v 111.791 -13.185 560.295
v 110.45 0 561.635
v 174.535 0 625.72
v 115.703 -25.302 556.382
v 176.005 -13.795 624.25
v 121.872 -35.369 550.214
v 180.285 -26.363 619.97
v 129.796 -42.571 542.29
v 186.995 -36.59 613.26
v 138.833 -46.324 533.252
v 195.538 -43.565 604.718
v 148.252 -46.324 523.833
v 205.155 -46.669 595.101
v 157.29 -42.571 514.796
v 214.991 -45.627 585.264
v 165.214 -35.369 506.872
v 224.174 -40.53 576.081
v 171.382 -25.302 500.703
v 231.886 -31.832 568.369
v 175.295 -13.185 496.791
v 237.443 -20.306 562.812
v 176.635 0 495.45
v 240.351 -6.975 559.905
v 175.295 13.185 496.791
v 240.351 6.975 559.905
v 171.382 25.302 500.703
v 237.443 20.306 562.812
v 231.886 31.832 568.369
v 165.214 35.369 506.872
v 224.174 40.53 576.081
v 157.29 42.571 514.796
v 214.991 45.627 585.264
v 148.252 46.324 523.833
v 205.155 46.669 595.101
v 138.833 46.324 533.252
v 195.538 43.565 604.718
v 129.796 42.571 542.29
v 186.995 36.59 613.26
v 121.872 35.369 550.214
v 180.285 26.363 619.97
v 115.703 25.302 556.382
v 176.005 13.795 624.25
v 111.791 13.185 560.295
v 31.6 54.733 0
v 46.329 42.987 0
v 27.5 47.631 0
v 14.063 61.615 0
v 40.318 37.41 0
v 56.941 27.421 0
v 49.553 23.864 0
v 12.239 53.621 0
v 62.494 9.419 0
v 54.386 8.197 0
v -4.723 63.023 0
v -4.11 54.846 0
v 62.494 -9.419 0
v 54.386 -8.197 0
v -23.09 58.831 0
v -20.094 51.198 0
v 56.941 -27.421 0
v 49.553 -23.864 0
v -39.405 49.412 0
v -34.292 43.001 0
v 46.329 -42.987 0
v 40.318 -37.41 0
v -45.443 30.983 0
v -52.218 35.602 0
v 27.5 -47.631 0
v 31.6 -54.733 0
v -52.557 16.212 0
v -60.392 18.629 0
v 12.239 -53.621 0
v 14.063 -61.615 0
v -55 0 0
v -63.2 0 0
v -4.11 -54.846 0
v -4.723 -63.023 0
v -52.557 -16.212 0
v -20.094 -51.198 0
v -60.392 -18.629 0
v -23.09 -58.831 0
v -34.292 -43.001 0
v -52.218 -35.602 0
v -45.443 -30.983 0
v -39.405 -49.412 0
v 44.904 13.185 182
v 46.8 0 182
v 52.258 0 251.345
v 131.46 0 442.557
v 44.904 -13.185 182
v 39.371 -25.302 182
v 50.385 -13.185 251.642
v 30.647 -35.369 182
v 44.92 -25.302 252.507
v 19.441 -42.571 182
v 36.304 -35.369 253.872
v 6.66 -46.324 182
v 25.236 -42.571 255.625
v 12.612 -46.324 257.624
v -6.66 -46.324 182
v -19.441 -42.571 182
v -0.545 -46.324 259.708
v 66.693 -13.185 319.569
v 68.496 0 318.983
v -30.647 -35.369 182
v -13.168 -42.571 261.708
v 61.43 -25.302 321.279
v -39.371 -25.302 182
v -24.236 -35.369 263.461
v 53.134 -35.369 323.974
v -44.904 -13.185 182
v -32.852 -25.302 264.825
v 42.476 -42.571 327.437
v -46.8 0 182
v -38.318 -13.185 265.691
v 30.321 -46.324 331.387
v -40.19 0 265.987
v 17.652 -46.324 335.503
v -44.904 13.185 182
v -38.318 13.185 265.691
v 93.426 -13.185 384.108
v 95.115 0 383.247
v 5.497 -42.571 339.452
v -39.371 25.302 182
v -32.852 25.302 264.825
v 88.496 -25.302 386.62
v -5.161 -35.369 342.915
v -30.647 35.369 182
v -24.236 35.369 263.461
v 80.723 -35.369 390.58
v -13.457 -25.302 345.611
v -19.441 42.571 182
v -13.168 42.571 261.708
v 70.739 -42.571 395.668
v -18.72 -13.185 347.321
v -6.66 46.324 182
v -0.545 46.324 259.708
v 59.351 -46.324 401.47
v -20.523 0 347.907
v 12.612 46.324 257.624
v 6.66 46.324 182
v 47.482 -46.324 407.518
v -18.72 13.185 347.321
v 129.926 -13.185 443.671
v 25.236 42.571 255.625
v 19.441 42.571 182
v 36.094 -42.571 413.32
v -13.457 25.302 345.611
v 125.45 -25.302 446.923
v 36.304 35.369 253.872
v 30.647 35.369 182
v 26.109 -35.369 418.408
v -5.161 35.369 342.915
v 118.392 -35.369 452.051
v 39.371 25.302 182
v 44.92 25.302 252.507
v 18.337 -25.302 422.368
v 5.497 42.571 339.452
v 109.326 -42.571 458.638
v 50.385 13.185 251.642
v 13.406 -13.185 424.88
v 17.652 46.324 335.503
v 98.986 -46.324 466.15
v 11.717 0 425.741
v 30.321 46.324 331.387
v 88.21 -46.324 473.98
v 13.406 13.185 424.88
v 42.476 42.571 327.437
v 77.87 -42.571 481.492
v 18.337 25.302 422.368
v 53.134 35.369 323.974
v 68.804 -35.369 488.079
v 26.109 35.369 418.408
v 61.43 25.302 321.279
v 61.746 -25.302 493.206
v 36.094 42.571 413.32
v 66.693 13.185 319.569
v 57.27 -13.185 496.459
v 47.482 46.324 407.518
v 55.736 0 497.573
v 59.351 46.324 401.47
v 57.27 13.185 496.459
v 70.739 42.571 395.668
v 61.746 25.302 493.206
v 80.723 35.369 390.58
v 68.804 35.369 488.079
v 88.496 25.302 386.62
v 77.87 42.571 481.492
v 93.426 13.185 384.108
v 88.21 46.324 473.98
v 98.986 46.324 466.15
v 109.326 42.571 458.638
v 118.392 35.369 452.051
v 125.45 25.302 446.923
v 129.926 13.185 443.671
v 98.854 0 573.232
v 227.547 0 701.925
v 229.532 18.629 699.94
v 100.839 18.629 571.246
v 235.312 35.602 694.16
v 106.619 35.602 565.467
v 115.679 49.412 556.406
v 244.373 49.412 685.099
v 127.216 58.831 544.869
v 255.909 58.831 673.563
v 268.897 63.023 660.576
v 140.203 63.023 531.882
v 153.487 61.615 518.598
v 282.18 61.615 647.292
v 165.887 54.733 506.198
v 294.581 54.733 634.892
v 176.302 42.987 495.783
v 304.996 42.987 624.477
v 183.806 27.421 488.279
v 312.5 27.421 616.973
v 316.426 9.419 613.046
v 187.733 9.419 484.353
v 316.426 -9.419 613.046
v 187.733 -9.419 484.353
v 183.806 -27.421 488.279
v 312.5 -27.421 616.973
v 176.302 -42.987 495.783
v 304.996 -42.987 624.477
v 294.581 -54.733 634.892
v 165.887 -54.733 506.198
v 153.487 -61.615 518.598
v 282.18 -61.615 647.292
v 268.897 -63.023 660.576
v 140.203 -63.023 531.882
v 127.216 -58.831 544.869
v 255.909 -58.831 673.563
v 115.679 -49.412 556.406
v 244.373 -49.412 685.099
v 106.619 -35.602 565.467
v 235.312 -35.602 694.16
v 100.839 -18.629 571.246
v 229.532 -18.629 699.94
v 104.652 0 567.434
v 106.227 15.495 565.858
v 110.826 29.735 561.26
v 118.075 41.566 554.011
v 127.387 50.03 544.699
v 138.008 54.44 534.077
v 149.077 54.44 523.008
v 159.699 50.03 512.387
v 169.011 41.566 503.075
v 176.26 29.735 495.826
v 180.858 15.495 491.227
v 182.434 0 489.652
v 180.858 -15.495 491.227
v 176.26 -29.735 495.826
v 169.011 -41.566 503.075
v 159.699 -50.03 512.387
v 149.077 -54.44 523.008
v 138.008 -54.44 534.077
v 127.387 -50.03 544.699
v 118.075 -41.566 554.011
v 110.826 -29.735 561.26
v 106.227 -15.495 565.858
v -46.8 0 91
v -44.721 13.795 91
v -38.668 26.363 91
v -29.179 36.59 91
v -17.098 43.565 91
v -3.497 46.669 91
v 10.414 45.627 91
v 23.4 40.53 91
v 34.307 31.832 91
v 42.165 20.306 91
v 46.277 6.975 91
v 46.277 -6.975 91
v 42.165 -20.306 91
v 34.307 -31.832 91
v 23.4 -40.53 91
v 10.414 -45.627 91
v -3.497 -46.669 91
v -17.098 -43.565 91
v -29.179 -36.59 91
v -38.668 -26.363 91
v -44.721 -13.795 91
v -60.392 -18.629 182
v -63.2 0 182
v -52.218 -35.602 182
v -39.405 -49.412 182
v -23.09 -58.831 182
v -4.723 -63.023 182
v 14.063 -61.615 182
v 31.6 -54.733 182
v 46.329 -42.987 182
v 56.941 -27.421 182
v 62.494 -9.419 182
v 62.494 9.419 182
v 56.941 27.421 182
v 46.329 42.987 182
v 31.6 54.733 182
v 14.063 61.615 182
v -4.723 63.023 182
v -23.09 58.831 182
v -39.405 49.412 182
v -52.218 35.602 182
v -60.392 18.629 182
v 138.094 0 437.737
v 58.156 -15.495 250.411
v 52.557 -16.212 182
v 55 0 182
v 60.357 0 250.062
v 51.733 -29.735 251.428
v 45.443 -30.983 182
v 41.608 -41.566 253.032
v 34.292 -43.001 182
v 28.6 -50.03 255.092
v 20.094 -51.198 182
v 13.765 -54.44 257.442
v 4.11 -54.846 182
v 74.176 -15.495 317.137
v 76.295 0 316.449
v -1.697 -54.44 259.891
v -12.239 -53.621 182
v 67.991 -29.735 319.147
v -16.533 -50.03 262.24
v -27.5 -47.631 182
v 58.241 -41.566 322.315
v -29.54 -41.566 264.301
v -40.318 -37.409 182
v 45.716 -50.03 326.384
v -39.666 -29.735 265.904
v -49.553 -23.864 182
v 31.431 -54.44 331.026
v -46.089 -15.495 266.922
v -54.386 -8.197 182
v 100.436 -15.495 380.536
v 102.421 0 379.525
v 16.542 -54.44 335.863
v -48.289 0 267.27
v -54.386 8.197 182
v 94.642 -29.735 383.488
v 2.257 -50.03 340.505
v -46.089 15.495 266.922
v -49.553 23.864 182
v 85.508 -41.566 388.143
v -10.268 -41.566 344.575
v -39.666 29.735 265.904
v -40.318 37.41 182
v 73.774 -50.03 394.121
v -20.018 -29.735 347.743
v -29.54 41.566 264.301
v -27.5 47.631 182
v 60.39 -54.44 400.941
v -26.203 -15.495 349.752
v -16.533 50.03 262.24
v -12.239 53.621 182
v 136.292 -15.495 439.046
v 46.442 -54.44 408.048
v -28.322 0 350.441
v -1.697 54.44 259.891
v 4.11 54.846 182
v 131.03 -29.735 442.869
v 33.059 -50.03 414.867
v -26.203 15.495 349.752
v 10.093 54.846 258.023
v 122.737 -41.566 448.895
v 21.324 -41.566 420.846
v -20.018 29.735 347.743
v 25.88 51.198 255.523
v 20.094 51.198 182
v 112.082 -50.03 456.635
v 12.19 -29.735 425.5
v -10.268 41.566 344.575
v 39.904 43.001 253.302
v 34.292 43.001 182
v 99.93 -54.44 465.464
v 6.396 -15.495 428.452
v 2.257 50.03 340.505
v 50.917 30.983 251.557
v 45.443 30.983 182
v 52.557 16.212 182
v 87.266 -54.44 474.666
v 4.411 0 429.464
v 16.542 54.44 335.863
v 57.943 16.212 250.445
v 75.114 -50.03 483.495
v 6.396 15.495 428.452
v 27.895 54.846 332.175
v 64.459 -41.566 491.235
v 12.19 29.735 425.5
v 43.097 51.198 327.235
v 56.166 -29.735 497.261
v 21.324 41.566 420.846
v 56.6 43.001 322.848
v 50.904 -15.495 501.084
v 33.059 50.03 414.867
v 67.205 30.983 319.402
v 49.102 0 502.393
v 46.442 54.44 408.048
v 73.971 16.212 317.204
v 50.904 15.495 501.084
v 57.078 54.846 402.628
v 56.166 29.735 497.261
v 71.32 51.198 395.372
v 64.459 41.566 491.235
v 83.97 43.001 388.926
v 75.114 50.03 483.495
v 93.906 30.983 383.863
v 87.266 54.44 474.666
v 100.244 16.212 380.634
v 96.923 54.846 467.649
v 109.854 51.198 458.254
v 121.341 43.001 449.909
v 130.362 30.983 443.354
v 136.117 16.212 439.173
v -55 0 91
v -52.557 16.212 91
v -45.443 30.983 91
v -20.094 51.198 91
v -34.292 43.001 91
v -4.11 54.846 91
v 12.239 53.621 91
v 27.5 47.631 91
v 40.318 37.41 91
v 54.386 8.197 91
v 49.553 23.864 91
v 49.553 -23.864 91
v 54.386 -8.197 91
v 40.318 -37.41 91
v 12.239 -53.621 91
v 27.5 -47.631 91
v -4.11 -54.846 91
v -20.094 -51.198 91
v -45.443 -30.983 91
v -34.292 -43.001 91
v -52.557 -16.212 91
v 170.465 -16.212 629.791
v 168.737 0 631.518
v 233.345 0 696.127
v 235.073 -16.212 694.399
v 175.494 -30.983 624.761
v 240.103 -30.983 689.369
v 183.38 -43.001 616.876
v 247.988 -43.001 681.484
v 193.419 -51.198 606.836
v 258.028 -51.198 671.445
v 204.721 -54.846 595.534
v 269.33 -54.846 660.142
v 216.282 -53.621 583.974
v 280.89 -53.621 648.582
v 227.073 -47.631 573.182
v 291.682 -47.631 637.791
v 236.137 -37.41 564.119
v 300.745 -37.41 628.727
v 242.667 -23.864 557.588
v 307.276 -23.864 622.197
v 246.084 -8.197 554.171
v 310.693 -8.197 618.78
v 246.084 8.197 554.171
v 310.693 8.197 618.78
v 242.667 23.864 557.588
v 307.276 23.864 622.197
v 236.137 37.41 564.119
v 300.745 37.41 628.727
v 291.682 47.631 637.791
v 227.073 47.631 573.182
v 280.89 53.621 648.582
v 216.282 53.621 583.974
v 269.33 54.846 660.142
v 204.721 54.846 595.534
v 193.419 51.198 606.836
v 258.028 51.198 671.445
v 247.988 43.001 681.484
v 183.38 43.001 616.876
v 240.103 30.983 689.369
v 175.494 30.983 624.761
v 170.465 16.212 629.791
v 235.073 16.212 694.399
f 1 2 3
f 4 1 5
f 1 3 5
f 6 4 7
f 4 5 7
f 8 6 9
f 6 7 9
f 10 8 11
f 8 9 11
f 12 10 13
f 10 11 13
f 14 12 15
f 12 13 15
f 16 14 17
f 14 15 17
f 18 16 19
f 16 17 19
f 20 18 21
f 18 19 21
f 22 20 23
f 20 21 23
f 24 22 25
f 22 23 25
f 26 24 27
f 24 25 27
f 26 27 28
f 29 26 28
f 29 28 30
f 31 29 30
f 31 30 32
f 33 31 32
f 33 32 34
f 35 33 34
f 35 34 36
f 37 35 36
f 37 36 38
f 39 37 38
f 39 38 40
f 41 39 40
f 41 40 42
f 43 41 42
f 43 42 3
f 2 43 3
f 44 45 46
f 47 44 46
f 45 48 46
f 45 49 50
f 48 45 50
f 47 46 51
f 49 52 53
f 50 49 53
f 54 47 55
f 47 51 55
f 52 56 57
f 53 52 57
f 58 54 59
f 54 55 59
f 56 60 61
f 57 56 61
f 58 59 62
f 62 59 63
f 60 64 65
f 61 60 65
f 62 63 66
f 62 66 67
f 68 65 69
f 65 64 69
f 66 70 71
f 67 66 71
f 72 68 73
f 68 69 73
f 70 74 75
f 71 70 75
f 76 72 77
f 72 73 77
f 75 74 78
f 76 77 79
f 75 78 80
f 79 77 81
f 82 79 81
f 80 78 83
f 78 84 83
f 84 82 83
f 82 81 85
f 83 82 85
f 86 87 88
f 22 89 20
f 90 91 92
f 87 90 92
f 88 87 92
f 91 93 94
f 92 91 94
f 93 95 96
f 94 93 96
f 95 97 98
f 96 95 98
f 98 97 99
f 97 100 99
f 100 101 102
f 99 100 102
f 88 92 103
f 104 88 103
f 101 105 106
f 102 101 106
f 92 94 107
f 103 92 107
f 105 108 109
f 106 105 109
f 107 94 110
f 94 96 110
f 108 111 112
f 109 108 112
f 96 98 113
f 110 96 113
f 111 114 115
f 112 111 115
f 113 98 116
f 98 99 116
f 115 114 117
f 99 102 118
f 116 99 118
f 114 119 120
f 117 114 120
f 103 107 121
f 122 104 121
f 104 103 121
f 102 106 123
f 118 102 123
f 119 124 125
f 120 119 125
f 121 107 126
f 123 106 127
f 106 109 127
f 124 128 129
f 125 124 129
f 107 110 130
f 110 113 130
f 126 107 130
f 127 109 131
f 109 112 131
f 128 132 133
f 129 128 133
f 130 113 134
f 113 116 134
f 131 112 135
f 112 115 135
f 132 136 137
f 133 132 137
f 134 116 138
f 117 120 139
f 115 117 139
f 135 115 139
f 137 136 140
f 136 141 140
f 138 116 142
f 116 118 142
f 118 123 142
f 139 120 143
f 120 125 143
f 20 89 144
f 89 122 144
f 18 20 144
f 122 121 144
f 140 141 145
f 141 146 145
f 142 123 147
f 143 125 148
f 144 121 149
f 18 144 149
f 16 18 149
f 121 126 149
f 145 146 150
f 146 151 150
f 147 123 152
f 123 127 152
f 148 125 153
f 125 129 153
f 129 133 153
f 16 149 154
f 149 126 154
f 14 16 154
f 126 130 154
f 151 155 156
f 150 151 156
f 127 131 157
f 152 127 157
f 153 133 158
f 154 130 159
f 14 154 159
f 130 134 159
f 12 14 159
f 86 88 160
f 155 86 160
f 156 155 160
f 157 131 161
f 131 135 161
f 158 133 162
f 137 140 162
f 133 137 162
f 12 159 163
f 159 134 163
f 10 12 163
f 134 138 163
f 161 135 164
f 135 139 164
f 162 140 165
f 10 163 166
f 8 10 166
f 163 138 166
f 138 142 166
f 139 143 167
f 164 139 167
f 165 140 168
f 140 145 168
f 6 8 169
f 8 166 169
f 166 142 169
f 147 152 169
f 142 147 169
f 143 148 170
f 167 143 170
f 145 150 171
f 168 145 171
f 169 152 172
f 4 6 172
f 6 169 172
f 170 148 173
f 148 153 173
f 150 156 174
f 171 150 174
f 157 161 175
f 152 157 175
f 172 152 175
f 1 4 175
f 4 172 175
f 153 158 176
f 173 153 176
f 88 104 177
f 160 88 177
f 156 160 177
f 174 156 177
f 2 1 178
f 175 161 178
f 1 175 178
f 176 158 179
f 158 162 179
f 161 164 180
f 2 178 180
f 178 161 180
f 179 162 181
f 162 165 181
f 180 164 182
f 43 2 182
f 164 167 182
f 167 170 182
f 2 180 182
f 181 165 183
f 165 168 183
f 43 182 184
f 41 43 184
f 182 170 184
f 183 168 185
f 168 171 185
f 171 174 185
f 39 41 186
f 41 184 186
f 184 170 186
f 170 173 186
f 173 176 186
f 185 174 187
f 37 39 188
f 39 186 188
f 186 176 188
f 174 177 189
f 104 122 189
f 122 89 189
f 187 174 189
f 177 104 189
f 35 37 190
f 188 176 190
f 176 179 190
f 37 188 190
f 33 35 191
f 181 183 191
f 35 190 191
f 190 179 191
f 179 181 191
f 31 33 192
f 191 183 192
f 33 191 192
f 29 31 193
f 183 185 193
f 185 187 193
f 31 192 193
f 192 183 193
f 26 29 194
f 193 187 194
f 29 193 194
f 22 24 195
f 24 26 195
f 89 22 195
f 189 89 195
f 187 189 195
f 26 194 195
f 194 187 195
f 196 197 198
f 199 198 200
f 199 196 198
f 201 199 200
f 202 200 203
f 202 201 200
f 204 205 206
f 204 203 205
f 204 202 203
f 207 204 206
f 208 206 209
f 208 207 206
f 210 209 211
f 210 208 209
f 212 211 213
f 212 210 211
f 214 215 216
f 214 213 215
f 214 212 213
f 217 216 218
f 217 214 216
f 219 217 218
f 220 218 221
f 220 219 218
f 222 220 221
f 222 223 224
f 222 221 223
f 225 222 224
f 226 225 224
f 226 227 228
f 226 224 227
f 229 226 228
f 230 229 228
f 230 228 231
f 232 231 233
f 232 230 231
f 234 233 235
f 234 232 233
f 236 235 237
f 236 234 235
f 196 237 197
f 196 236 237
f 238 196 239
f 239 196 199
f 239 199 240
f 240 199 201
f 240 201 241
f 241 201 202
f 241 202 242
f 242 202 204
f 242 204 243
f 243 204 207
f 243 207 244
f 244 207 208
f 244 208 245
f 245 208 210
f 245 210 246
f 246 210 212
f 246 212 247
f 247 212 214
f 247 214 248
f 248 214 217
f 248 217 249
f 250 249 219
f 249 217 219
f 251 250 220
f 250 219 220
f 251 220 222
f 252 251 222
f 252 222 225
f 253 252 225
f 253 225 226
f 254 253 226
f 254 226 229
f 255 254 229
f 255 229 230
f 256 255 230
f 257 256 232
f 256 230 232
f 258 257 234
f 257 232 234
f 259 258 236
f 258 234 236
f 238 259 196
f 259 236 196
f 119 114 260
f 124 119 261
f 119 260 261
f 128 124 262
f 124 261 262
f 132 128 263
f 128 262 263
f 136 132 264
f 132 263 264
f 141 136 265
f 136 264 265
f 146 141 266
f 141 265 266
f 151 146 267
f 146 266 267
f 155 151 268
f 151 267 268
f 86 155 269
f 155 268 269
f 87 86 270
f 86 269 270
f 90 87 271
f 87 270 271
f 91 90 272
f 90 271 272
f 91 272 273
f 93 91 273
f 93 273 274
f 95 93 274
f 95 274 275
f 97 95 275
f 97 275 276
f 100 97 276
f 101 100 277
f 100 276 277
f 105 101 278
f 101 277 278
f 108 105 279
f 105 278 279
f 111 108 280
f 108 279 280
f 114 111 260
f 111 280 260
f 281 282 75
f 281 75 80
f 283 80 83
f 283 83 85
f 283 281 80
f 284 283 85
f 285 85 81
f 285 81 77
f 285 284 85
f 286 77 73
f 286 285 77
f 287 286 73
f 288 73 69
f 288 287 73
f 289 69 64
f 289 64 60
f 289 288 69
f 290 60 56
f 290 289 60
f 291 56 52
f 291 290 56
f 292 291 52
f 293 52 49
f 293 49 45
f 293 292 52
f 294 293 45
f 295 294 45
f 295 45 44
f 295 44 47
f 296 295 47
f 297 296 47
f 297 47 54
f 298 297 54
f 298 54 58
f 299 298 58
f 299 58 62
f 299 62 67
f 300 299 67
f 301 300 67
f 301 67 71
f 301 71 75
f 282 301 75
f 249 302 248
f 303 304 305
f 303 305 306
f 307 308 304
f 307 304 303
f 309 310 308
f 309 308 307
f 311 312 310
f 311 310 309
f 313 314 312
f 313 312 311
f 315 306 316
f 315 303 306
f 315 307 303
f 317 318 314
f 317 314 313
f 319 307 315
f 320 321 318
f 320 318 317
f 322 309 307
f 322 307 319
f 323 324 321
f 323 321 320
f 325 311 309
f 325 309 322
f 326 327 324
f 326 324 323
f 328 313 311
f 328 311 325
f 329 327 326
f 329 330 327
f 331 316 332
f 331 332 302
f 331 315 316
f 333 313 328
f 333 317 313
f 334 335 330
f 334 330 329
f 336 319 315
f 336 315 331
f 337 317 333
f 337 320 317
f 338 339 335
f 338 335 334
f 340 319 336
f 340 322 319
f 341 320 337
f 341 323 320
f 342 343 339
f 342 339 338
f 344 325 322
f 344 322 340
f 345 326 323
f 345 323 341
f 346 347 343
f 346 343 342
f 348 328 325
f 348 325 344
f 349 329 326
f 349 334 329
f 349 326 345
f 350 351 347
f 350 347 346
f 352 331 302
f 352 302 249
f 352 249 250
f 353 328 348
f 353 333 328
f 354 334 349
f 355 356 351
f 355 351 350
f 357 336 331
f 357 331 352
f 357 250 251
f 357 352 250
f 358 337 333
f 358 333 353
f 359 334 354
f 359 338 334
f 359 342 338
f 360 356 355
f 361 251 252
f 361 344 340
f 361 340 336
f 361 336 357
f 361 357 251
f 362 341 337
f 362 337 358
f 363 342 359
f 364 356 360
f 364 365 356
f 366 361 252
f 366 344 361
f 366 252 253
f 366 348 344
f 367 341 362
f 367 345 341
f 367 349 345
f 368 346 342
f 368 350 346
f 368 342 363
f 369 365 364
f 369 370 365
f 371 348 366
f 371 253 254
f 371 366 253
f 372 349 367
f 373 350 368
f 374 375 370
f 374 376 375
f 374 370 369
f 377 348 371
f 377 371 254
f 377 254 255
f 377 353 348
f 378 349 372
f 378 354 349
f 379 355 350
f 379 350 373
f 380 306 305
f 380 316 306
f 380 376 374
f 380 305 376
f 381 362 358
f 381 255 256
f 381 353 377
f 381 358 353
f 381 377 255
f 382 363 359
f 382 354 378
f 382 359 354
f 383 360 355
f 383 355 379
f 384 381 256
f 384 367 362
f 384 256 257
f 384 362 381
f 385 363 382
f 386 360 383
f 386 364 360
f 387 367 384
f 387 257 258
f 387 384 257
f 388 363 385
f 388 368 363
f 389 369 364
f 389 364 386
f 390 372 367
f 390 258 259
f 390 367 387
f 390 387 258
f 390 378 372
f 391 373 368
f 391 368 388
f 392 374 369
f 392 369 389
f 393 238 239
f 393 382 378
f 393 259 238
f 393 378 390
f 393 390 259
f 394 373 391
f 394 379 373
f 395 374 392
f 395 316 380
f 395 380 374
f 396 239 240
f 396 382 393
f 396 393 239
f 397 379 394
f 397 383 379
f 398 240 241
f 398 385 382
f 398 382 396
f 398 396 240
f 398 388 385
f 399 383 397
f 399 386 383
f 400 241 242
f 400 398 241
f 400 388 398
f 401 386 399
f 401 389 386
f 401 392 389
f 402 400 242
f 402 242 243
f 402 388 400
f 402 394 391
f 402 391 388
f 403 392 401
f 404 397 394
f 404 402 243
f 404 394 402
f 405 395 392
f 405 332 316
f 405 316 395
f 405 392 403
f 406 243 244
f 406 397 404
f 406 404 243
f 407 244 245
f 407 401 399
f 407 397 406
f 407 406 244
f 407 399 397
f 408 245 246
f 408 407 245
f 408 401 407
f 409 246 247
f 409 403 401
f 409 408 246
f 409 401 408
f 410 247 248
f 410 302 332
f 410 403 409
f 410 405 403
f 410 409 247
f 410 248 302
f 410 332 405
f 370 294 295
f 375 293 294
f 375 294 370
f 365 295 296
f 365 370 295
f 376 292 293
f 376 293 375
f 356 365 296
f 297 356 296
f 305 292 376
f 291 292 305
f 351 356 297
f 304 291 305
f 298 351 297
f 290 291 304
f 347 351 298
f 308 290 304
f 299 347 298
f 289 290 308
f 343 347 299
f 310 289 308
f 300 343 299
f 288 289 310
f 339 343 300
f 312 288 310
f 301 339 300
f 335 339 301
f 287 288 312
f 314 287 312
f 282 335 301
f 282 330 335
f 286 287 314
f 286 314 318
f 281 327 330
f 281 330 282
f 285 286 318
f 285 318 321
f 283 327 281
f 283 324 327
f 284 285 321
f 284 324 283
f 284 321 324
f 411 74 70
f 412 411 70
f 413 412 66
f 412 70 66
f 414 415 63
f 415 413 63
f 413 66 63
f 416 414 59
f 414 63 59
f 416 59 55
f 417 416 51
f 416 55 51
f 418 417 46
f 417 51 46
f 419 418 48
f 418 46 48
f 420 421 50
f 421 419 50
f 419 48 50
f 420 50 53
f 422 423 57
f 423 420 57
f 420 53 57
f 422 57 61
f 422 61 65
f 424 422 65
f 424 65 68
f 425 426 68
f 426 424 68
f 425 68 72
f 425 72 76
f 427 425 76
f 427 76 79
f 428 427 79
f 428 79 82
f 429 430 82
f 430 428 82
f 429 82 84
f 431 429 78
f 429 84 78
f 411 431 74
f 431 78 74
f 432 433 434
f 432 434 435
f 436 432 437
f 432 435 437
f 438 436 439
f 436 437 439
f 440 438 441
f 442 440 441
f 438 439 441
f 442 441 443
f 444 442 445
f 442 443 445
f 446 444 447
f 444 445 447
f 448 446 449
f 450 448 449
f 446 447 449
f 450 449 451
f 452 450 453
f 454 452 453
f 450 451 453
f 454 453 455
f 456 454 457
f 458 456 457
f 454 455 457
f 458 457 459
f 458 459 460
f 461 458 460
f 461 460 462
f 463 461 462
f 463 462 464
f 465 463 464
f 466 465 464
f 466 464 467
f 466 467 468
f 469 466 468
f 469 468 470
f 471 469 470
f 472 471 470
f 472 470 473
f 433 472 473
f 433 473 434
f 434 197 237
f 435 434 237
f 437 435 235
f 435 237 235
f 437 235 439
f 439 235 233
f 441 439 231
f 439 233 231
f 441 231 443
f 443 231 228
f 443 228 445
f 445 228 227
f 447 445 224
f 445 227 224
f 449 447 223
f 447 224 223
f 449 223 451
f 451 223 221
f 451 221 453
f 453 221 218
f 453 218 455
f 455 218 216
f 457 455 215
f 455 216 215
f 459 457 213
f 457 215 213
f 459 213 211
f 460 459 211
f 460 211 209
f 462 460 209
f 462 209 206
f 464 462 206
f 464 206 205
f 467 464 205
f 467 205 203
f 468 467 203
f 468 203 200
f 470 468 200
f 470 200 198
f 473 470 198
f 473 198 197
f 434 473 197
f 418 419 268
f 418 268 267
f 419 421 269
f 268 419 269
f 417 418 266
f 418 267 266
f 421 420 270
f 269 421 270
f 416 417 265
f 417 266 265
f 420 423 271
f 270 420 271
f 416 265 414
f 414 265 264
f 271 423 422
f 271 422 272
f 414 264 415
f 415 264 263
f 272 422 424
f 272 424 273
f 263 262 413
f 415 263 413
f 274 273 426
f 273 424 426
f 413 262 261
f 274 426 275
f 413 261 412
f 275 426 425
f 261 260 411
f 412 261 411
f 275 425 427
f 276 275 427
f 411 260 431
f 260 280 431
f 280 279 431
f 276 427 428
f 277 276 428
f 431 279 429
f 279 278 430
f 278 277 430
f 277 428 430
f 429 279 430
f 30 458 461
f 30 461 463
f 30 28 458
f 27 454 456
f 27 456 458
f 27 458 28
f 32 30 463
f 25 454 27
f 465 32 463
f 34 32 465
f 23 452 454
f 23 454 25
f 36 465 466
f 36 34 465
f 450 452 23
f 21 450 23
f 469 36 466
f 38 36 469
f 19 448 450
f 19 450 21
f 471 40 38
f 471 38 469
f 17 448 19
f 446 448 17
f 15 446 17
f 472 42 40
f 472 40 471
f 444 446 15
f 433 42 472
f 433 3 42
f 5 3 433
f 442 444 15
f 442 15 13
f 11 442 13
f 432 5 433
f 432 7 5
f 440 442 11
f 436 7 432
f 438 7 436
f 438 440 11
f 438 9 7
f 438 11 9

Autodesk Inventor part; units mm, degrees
ref_plane "YZ Plane" through (0, 0, 0) normal (1, 0, 0) x (0, 1, 0)
ref_plane "XZ Plane" through (0, 0, 0) normal (0, 1, 0) x (-1, 0, 0)
ref_plane "XY Plane" through (0, 0, 0) normal (0, 0, 1) x (1, 0, 0)
sketch "Sketch1" plane through (0, 0, 0) normal (0, 1, 0) x (-1, 0, 0)
  line L0 (0, 0) -> (0, 182) construction
  line L1 (0, 182) -> (46.8, 182) construction
  line L2 (46.8, 182) -> (46.8, 91)
  line L3 (46.8, 91) -> (55, 91)
  line L4 (55, 91) -> (55, 0)
  line L5 (55, 0) -> (63.2, 0)
  line L6 (63.2, 0) -> (63.2, 182)
  line L7 (63.2, 182) -> (46.8, 182)
  line L8 (55, 0) -> (0, 0) construction
  line L9 (0, 182) -> (0, 385) construction
  line L10 (0, 385) -> (-143.5427, 528.5427) construction
  line L11 (-143.5427, 528.5427) -> (-110.4501, 561.6353) construction
  line L12 (-110.4501, 561.6353) -> (-174.535, 625.7202)
  line L13 (-174.535, 625.7202) -> (-168.7367, 631.5185)
  line L14 (-168.7367, 631.5185) -> (-233.3452, 696.127)
  line L15 (-233.3452, 696.127) -> (-227.547, 701.9253)
  line L16 (-227.547, 701.9253) -> (-98.8535, 573.2318)
  line L17 (-110.4501, 561.6353) -> (-98.8535, 573.2318)
  line L18 (-143.5427, 528.5427) -> (-272.2361, 657.2361) construction
  line L19 (-233.3452, 696.127) -> (-272.2361, 657.2361) construction
  line L20 (0, 182) -> (-490.0854, 182) construction
  line L21 (-143.5427, 528.5427) -> (-490.0854, 182) construction
  arc A0 (0, 182) -> (-143.5427, 528.5427) centre (-490.0854, 182) ccw
  line L22 (-143.5427, 528.5427) -> (-143.5427, 182) construction
  line L23 (46.8, 91) -> (0, 91) construction
  line L24 (-174.535, 625.7202) -> (-207.6276, 592.6276) construction
  dimension "d0" = 182
  dimension "d1" = 91
  dimension "d2" = 93.6
  dimension "d3" = 110
  dimension "d4" = 126.4
  dimension "d5" = 203
  dimension "d6" = 203
  dimension "d7" = 182
  dimension "d8" = 91
  dimension "d9" = 93.6
  dimension "d10" = 110
  dimension "d11" = 126.4
  dimension "d12" = 45
revolve "Revolve1" add sketch "Sketch1" angle 360 about axis through (0, 0, 0) along (0, 0, 1) contours L7 L6 L5 L4 L3 L2
revolve "Revolve2" add sketch "Sketch1" angle 360 about axis through (143.5427, 0, 528.5427) along (0.7071068, 0, 0.7071068) contours L12 L13 L14 L15 L16 L17
sketch "Sketch2" plane through (0, 0, 182) normal (0, 0, 1) x (1, 0, 0)
  circle A0 centre (0, 0) radius 46.8 projected
  circle A1 centre (0, 0) radius 55 projected
sweep "Sweep1" add profiles "Sketch2" path "Sketch1" path curves A0
equation "\"d0\" = 2 * tk"
equation "\"d1\" = tk"
equation "\"d2\" = d - 2 * s1"
equation "\"d3\" = d"
equation "\"d4\" = d + 2 * s1"
equation "\"d5\" = zk"
equation "\"d6\" = zk"
equation "\"d7\" = 2 * tk"
equation "\"d8\" = tk"
equation "\"d9\" = d - 2 * s1"
equation "\"d10\" = d"
equation "\"d11\" = d + 2 * s1"
equation "\"zk\" = 203"
equation "\"tk\" = 91"
equation "\"d\" = 110"
equation "\"s1\" = 8.2"
properties part number "DIN 8063 Двойная подвижная соединительная муфта с изгибом 45 градусов со стыковой сваркой - MMK - KK 110 - 5" material "ПВХ, непластифицированный"
